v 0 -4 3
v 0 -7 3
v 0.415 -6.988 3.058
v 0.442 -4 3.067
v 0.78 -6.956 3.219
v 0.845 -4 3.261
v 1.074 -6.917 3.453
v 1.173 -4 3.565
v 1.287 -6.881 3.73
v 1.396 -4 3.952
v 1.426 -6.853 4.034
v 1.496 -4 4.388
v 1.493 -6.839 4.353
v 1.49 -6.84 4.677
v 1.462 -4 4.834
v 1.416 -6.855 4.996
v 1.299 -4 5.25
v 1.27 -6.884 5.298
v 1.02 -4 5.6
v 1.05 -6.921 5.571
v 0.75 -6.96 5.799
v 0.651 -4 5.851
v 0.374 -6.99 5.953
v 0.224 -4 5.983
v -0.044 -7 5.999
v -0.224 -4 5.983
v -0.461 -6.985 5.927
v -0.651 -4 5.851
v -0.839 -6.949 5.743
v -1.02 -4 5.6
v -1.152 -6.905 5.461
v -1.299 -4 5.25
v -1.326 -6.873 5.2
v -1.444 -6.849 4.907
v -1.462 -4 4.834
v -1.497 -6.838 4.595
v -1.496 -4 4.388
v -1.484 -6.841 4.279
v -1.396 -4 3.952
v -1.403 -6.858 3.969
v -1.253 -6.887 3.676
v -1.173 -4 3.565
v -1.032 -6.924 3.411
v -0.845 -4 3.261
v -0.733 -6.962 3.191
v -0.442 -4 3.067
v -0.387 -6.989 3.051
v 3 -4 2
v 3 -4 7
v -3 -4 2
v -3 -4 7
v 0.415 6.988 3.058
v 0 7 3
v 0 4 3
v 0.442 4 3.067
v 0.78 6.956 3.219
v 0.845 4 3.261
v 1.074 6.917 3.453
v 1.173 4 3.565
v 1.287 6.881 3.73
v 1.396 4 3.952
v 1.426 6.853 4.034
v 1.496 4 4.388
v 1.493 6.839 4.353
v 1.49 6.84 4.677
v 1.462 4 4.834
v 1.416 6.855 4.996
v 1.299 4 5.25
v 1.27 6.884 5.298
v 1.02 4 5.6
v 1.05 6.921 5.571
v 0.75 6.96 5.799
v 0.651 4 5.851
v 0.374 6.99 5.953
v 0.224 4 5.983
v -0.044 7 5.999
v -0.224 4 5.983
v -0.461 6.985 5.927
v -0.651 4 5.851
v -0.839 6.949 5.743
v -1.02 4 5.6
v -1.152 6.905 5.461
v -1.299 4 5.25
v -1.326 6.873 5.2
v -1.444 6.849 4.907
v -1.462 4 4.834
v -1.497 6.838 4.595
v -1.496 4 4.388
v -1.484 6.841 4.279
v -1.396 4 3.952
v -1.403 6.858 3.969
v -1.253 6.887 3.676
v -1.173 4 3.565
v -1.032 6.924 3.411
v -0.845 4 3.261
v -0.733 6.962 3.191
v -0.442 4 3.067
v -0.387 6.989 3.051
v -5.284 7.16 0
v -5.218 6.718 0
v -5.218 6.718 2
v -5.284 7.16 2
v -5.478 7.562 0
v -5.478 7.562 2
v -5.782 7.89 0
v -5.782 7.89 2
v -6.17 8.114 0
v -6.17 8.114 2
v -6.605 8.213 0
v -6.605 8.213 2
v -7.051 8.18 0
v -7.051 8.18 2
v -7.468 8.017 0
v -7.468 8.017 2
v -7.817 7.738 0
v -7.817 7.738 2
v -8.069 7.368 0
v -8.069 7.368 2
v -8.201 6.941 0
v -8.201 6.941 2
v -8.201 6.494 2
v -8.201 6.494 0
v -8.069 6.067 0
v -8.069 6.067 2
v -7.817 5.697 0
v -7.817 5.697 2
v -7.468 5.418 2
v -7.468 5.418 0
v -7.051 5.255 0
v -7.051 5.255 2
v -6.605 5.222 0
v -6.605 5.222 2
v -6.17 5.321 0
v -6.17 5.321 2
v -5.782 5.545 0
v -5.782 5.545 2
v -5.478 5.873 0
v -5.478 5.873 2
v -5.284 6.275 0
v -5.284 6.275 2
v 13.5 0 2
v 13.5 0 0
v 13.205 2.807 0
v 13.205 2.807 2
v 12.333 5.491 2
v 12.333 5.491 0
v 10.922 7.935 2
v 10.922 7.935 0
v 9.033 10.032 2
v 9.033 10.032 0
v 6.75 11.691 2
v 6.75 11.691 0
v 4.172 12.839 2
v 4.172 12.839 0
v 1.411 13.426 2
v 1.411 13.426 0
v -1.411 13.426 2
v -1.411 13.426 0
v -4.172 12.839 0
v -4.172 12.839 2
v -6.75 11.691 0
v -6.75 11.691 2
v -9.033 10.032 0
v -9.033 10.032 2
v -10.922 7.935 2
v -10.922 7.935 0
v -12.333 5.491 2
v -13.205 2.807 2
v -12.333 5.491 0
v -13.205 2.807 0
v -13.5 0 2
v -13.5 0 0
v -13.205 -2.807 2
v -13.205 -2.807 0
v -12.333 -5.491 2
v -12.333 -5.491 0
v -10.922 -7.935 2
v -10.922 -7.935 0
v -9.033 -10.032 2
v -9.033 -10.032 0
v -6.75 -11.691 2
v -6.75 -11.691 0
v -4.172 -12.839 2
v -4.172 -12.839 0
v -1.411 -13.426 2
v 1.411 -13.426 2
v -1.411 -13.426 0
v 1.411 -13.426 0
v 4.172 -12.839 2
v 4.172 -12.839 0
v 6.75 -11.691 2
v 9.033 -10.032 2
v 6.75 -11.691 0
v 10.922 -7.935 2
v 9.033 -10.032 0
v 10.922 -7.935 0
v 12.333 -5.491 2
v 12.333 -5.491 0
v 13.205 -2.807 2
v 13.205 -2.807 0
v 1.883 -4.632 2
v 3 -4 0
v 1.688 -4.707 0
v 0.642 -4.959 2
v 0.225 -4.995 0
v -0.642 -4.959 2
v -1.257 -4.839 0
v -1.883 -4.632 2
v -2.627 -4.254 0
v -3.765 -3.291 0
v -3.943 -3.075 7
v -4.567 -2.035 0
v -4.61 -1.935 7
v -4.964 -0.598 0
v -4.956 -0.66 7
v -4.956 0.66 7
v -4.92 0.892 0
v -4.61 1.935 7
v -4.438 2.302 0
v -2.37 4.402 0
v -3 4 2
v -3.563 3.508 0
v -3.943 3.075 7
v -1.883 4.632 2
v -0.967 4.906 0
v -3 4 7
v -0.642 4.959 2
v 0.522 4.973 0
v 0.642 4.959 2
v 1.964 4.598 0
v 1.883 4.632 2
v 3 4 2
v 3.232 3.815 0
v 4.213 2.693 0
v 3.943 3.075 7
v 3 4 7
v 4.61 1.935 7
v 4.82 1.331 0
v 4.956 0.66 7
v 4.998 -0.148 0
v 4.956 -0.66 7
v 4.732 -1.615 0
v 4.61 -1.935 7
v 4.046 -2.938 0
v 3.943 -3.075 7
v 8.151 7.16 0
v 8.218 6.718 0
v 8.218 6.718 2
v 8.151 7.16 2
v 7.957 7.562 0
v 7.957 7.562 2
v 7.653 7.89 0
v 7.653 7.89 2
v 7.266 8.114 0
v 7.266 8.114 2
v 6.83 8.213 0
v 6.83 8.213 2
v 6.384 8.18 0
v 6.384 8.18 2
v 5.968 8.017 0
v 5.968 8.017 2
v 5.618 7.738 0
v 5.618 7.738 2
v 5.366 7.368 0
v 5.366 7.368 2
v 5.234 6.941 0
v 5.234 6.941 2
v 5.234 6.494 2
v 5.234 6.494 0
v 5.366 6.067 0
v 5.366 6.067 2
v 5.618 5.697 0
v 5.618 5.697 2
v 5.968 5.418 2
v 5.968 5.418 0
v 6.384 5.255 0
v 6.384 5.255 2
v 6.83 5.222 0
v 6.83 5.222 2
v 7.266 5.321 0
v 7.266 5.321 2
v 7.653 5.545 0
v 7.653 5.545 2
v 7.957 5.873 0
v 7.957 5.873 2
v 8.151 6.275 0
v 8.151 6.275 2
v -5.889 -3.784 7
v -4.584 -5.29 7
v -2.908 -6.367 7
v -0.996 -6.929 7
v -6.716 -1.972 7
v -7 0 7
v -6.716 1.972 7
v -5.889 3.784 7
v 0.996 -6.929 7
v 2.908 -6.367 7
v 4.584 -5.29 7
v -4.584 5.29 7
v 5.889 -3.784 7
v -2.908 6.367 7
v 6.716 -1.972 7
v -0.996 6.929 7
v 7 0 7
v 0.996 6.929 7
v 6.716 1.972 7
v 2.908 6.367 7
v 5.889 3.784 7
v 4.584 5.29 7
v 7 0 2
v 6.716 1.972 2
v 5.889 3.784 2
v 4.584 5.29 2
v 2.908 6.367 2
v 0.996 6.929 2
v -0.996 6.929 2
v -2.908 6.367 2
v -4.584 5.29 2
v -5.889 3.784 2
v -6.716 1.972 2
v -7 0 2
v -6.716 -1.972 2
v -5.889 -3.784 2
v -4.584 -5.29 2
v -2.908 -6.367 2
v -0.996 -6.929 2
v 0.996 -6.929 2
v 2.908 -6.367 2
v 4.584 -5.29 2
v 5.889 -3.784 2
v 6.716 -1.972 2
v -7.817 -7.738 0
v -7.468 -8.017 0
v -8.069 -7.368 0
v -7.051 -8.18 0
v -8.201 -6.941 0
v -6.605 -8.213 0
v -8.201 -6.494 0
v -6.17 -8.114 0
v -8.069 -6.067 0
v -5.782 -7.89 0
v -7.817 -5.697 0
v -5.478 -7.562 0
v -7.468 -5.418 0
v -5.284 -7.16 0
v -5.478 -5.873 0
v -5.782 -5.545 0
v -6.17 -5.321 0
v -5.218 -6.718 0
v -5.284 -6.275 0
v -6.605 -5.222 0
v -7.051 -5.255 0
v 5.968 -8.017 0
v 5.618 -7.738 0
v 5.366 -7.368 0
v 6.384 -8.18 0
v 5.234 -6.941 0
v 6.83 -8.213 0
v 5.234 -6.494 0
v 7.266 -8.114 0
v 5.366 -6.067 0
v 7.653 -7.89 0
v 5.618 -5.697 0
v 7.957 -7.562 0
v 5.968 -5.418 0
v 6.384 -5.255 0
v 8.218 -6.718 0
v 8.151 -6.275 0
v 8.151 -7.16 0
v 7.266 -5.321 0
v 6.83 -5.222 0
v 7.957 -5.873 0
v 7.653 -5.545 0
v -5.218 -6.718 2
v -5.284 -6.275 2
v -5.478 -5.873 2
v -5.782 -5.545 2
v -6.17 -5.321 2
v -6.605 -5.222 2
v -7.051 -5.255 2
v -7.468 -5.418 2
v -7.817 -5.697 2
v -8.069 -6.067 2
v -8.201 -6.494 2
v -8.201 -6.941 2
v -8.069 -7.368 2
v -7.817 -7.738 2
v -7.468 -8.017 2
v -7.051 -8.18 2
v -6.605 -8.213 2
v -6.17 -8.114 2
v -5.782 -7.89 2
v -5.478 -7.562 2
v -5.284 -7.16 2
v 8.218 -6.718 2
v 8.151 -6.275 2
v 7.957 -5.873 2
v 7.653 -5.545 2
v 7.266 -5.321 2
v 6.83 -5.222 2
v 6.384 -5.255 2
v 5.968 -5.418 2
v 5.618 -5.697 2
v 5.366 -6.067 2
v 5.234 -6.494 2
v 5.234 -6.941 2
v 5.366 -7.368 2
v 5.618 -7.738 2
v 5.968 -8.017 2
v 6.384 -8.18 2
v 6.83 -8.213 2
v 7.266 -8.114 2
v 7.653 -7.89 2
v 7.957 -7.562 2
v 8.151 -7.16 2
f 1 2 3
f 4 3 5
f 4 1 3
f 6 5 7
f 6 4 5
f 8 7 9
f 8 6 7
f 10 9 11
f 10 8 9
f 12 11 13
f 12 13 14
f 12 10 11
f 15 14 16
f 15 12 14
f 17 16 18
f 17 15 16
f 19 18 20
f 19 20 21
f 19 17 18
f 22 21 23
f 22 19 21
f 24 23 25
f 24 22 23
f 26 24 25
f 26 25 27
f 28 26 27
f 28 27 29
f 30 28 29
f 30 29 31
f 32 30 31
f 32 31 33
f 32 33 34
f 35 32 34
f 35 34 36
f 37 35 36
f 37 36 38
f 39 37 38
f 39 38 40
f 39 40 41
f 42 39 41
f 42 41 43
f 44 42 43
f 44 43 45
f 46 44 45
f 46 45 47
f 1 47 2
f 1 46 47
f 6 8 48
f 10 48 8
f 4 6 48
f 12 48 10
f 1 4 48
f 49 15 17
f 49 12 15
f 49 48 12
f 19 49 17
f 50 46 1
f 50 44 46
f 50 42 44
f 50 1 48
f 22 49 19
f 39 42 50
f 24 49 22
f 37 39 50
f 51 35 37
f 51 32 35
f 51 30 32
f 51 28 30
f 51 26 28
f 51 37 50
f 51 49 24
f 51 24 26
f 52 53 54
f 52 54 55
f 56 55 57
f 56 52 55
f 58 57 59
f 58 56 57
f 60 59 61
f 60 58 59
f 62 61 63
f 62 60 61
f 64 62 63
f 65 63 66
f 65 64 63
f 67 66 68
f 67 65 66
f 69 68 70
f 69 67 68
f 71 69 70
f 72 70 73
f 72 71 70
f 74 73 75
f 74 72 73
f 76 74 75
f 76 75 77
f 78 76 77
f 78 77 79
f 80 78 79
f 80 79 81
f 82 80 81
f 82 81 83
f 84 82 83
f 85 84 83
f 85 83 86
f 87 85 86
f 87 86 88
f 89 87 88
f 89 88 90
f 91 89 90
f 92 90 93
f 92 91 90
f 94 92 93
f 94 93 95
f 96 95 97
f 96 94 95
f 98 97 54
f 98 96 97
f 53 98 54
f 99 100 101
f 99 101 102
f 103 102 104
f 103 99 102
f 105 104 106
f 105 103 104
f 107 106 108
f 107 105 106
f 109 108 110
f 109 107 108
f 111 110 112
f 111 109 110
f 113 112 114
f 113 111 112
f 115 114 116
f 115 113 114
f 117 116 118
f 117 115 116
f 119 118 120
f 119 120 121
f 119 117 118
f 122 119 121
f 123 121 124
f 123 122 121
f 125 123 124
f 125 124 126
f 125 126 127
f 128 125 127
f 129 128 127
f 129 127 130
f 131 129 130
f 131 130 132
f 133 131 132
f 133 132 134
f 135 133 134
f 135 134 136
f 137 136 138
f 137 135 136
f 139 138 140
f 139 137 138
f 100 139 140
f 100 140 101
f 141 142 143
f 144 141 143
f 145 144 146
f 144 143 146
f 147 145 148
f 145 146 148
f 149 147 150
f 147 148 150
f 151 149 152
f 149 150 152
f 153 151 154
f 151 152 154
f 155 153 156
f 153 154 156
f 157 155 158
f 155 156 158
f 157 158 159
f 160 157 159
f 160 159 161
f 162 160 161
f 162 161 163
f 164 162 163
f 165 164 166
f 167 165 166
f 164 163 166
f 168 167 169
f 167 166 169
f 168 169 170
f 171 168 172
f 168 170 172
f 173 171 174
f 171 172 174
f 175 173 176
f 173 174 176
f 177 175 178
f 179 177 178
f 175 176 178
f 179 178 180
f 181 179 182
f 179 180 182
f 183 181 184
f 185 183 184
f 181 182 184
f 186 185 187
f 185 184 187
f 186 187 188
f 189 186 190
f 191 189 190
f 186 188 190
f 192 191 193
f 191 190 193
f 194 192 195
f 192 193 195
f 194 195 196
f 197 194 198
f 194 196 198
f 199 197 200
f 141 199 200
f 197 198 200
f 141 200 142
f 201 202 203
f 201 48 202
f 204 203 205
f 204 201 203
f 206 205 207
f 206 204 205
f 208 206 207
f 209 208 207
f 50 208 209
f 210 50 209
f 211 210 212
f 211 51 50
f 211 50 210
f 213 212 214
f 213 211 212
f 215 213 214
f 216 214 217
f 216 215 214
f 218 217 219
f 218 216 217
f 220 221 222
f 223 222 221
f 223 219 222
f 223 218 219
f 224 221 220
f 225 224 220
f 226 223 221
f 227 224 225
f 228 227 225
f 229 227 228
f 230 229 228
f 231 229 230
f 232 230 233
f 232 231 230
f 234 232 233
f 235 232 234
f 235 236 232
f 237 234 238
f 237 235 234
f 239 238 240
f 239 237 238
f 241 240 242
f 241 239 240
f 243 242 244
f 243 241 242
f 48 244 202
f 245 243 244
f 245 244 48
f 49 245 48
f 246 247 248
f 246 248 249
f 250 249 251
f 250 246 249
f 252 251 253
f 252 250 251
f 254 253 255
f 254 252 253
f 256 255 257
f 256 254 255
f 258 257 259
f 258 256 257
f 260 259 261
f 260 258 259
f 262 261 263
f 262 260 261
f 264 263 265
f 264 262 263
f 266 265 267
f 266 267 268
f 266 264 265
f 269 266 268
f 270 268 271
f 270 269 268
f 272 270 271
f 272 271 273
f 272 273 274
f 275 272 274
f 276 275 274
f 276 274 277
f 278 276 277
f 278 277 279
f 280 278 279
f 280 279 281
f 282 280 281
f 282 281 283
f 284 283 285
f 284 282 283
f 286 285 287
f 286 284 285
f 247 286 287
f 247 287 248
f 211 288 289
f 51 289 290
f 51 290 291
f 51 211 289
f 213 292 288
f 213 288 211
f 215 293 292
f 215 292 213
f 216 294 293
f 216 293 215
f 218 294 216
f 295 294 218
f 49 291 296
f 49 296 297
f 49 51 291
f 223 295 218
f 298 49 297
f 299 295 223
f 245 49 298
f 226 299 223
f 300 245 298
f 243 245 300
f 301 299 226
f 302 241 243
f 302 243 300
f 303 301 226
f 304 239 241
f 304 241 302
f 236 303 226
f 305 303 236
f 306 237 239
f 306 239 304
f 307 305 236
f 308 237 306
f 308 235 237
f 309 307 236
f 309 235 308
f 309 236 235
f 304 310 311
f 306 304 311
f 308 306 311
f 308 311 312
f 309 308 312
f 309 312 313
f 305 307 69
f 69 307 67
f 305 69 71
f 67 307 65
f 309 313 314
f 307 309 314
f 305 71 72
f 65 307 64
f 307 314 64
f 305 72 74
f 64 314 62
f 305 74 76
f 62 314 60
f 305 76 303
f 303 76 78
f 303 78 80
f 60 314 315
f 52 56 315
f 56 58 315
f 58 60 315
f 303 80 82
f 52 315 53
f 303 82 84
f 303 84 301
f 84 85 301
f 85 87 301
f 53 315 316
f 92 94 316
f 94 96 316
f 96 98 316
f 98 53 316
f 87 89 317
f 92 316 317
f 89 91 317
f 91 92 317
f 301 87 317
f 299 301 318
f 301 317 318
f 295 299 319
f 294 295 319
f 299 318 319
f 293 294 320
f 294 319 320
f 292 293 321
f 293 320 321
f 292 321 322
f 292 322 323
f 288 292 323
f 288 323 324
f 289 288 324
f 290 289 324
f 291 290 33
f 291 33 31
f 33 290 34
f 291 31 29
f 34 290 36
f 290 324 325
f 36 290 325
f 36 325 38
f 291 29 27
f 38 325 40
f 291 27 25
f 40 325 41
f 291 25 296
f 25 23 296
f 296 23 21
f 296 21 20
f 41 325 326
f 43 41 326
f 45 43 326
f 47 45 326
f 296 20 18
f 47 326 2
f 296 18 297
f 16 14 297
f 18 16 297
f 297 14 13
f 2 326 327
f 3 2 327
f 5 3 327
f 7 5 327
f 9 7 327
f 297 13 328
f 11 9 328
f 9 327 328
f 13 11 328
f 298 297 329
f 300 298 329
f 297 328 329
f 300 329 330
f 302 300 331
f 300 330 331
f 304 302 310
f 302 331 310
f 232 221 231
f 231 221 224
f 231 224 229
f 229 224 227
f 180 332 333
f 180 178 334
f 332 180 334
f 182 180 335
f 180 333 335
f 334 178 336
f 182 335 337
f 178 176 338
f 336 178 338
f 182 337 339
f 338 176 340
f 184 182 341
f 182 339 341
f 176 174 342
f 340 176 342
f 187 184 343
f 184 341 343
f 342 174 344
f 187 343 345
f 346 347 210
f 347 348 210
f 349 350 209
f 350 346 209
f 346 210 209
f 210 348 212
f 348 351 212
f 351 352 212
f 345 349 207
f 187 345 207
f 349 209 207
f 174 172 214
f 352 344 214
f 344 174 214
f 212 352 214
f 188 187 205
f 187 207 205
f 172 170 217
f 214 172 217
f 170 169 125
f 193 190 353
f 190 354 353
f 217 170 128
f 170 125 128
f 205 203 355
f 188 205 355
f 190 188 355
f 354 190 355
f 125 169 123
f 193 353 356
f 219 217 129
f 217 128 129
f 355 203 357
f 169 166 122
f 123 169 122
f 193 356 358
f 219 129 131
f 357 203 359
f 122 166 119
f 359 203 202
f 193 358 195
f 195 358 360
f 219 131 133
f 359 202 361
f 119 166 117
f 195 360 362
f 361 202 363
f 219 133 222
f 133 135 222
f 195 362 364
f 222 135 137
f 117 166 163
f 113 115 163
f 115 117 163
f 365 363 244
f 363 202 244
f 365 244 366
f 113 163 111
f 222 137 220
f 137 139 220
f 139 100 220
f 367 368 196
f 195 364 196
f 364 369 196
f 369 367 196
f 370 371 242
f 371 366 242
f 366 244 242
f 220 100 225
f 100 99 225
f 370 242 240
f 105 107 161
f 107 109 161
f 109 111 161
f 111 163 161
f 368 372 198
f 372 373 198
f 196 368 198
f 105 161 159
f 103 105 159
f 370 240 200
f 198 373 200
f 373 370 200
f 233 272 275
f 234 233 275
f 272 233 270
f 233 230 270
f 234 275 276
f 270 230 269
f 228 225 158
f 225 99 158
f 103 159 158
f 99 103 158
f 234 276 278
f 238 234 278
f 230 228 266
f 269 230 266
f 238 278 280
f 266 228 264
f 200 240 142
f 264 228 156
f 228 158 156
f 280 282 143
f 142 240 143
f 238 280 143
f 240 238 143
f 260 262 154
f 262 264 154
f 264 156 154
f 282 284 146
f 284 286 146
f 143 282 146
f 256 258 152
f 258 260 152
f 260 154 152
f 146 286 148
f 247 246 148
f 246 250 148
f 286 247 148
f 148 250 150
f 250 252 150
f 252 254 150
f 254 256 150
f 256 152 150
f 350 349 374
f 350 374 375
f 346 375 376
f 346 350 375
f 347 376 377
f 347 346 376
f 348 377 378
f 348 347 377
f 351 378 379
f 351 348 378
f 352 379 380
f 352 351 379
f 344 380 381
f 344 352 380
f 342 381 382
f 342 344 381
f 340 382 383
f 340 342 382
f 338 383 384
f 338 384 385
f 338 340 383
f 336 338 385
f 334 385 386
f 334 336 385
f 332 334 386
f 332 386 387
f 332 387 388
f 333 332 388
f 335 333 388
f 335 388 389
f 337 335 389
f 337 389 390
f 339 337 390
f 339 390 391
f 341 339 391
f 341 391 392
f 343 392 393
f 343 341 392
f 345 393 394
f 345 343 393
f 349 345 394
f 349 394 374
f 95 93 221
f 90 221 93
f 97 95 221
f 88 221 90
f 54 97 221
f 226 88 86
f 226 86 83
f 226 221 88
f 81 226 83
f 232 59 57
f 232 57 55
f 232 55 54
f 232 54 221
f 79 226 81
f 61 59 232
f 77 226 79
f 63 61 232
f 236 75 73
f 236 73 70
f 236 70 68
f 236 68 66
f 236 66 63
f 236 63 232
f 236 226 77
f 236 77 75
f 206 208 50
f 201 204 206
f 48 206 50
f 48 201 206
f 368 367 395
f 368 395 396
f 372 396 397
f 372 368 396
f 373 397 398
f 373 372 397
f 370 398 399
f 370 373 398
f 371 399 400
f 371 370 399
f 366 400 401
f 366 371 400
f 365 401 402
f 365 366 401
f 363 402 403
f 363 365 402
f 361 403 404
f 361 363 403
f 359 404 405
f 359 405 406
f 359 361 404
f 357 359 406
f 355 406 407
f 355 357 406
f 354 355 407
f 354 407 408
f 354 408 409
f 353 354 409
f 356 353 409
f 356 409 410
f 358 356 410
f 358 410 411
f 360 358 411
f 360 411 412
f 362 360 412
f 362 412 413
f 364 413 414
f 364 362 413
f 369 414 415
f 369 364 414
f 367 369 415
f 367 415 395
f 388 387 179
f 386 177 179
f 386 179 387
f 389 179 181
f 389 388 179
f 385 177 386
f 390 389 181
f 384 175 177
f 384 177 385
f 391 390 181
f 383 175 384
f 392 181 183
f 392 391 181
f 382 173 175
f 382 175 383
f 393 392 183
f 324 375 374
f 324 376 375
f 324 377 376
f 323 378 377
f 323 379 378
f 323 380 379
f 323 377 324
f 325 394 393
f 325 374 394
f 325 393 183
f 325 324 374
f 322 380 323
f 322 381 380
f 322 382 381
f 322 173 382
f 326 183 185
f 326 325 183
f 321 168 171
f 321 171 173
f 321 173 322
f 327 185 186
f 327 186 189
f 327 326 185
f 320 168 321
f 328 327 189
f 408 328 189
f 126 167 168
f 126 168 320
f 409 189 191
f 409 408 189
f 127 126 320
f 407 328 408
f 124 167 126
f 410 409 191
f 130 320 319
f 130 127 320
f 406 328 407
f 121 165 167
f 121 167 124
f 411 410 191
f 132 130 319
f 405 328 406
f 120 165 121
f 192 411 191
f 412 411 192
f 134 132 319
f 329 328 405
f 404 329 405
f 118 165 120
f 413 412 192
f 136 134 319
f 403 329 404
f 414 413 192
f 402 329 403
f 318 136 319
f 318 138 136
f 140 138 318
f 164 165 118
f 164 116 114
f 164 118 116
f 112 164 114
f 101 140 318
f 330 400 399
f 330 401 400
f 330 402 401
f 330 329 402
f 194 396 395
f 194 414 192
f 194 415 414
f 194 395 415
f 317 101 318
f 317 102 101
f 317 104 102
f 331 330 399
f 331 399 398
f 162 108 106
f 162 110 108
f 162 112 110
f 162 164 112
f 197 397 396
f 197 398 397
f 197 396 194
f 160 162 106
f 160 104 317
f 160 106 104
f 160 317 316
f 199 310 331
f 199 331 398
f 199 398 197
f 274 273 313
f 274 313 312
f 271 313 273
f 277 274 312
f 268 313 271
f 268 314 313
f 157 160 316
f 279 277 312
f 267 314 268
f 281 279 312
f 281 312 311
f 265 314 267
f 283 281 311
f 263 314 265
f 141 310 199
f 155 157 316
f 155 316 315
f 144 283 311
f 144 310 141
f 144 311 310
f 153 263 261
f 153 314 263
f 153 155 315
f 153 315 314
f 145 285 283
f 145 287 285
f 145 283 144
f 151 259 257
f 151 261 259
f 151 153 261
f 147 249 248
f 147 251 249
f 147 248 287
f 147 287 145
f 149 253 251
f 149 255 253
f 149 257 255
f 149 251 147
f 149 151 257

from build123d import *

# Parameters (mm, degrees)
SKETCH_1_R               = 13.5
SKETCH_1_R_2             = 1.5
EXTRUDE_1_DEPTH          = 2
SKETCH_2_R               = 7
EXTRUDE_2_DEPTH          = 5
CUT_EXTRUDE_1_DEPTH      = 21.334699408
CUT_EXTRUDE_2_DEPTH      = 24.184046239
CUT_EXTRUDE_2_DEPTH_BACK = 24.184046239
SKETCH_4_R               = 1.5
CUT_EXTRUDE_START        = -2
SKETCH_5_R               = 5
CUT_EXTRUDE_3_DEPTH      = 2


with BuildPart() as part:
    # 草图1 → 凸台-拉伸1 (new body)
    with BuildSketch(Plane.XY):
        Circle(SKETCH_1_R)
        with Locations((6.717514421, 6.717514421)):
            Circle(SKETCH_1_R_2, mode=Mode.SUBTRACT)
        with Locations((6.717514421, -6.717514421)):
            Circle(SKETCH_1_R_2, mode=Mode.SUBTRACT)
        with Locations((-6.717514421, -6.717514421)):
            Circle(SKETCH_1_R_2, mode=Mode.SUBTRACT)
        with Locations((-6.717514421, 6.717514421)):
            Circle(SKETCH_1_R_2, mode=Mode.SUBTRACT)
    extrude(amount=EXTRUDE_1_DEPTH)

    # 草图2 → 凸台-拉伸2 (add)
    with BuildSketch(Plane.XY.offset(2)):
        Circle(SKETCH_2_R)
    extrude(amount=EXTRUDE_2_DEPTH)

    # 草图3 → 切除-拉伸1 (cut, through all)
    with BuildSketch(Plane.XY.offset(7)):
        with BuildLine():
            Line((-3, 4), (3, 4))
            ThreePointArc((3, 4), (5, 0), (3, -4))
            Line((3, -4), (-3, -4))
            ThreePointArc((-3, -4), (-5, 0), (-3, 4))
        make_face()
    extrude(amount=-CUT_EXTRUDE_1_DEPTH, mode=Mode.SUBTRACT)

    # 草图4 → 切除-拉伸2 (cut, two sides: drawn at the far end of the back side and taken through both)
    with BuildSketch(Plane.XZ.offset(-4).offset(-CUT_EXTRUDE_2_DEPTH_BACK)):
        with Locations(Location((0, 4.5, 0), (0, 0, 270))):
            Circle(SKETCH_4_R)
    extrude(amount=CUT_EXTRUDE_2_DEPTH + CUT_EXTRUDE_2_DEPTH_BACK, mode=Mode.SUBTRACT)

    # 草图5 → 切除-拉伸3 (cut)
    with BuildSketch(Plane(origin=(0, 0, 0), x_dir=(-1, 0, 0), z_dir=(0, 0, -1)).offset(CUT_EXTRUDE_START)):
        with Locations(Location((0, 0, 0), (0, 0, 180))):
            Circle(SKETCH_5_R)
    extrude(amount=CUT_EXTRUDE_3_DEPTH, mode=Mode.SUBTRACT)


solid = part.part
